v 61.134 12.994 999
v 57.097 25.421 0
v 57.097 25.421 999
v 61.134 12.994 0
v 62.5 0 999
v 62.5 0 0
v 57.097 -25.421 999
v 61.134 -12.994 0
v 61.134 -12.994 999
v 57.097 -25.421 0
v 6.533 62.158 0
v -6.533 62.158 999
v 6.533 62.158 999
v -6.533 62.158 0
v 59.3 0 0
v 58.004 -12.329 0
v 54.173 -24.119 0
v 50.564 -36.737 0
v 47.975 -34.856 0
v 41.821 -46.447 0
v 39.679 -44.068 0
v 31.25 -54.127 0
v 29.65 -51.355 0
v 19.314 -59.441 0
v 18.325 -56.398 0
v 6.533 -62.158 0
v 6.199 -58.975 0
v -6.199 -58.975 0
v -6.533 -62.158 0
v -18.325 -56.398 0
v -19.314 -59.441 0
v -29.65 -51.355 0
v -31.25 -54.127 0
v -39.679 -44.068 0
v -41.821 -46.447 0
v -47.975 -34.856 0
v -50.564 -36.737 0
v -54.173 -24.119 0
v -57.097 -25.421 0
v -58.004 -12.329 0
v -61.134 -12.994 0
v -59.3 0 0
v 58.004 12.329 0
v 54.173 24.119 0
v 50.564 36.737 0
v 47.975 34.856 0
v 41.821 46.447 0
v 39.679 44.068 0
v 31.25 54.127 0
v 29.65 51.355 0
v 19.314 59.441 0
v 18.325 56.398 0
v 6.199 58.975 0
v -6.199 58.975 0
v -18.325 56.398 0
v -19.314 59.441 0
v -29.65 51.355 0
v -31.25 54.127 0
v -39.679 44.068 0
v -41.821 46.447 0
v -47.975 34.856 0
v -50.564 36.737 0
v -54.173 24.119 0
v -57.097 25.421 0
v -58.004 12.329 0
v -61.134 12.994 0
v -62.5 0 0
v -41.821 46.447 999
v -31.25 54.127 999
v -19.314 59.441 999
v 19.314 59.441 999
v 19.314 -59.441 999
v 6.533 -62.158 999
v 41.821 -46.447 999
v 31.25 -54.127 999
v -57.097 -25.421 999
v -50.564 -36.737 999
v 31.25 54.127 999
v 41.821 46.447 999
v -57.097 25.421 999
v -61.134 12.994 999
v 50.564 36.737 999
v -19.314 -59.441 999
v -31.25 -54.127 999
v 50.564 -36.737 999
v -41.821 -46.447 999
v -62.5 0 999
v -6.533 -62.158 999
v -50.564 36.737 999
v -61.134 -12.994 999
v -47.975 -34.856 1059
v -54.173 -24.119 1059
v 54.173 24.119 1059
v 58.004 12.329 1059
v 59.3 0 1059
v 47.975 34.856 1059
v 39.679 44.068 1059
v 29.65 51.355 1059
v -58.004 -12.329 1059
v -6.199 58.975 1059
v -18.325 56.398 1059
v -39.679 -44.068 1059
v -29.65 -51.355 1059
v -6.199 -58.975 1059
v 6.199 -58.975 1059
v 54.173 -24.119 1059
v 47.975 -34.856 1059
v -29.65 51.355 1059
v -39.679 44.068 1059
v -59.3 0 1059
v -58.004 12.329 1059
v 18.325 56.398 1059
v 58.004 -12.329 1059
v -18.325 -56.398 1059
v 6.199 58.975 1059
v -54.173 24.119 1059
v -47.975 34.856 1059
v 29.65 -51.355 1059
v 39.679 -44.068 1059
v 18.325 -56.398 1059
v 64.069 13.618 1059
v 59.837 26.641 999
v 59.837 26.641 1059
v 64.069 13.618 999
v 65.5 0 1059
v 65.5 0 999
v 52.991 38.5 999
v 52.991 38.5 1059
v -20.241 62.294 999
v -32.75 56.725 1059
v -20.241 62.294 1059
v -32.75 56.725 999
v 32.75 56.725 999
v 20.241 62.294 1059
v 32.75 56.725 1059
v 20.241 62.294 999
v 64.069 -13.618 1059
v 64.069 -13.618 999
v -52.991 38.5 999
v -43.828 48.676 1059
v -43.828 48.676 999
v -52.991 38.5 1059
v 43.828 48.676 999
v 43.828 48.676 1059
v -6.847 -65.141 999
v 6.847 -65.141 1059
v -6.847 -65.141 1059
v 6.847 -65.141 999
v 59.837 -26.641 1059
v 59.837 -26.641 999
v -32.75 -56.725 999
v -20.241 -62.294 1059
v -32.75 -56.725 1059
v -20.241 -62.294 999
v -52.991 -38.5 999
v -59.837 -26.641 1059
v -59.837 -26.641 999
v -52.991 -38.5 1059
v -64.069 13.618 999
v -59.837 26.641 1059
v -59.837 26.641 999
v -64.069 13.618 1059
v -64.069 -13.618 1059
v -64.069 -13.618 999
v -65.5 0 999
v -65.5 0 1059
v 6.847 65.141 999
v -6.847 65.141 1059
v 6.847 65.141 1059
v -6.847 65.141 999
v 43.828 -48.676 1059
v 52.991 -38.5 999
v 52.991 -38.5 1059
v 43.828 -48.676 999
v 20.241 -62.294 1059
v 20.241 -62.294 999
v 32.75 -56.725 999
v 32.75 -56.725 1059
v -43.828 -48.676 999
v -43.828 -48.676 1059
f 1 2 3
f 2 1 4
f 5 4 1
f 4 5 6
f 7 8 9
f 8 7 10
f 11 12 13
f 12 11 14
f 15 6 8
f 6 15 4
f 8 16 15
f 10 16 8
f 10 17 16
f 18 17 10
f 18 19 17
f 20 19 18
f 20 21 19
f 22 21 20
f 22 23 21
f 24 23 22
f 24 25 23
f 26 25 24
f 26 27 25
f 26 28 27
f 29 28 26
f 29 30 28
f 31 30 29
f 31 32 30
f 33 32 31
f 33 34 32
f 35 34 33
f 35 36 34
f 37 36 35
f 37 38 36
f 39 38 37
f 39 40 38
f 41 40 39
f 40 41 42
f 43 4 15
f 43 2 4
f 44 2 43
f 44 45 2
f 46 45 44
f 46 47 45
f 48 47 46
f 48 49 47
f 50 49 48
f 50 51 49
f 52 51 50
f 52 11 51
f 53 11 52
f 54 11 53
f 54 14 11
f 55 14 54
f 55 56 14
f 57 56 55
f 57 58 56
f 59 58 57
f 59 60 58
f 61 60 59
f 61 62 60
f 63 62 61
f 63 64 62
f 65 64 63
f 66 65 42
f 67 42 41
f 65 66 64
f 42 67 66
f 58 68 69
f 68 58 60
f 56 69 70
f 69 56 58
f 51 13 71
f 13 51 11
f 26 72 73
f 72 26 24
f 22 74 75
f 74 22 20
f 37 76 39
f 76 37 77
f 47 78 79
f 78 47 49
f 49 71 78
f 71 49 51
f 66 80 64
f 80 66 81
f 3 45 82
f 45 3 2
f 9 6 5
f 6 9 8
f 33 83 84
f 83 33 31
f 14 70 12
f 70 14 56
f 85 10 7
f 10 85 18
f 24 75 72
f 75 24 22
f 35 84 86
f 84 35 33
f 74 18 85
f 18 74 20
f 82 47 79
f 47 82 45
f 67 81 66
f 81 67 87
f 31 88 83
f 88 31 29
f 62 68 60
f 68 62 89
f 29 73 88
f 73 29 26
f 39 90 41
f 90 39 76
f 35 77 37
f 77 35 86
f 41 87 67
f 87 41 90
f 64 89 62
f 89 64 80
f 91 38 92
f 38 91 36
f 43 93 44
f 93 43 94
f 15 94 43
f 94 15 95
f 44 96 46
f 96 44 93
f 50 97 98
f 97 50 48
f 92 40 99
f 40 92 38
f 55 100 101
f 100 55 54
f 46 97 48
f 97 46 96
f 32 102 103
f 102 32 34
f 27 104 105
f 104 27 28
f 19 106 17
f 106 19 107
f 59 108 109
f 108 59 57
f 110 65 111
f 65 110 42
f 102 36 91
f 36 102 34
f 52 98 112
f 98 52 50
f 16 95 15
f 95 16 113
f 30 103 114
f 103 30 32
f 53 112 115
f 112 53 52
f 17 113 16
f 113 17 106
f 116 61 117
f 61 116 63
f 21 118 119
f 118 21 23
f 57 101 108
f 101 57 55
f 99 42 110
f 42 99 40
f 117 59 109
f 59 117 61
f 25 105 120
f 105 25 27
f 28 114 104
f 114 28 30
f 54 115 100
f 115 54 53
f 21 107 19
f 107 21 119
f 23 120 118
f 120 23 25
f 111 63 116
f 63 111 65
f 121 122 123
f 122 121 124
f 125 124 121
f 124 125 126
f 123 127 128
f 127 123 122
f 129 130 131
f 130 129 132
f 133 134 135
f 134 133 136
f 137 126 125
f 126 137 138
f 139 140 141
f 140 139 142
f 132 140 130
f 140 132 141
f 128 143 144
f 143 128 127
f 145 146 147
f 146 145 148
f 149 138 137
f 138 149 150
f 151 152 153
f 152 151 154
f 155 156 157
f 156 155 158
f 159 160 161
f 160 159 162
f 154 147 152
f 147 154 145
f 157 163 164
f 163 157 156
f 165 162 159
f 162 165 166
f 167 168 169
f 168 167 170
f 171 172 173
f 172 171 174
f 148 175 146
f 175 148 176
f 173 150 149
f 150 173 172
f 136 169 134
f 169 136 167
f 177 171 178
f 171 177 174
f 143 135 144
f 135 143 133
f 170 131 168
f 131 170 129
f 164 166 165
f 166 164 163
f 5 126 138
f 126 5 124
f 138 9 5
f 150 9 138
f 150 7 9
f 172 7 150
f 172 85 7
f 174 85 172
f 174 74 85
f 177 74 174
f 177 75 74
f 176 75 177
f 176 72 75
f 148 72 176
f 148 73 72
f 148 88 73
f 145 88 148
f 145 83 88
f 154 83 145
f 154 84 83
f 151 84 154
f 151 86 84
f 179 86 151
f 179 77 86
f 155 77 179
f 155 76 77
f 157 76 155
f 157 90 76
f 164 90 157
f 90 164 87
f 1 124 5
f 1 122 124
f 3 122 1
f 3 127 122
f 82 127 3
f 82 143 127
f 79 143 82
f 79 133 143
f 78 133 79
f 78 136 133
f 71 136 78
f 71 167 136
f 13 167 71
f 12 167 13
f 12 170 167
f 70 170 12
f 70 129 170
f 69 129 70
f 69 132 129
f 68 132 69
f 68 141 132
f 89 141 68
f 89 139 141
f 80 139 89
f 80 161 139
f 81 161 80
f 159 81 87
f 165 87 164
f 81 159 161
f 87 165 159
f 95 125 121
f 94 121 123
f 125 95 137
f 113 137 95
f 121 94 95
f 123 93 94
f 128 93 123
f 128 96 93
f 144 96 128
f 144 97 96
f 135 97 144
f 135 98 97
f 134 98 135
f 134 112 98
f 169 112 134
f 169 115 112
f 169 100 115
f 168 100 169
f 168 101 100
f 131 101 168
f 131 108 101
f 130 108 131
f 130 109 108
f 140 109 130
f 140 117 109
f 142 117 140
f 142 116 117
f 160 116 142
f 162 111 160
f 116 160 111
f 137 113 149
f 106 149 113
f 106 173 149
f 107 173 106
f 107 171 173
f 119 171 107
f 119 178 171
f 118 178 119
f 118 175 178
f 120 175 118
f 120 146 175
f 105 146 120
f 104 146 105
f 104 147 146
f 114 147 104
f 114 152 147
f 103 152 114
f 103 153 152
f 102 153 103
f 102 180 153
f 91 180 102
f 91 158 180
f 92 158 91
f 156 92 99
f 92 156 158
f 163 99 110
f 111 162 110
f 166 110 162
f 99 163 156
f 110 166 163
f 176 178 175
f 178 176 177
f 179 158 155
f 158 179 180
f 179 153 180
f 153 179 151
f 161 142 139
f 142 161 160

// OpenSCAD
// Parameters
length_mm = 1000; //[500:2000:10]
ht125_outer_diameter = 125; //[100:250:1]
wall_thickness = 3.2; //[1.6:6.4:0.1]
socket_length = 60; //[30:120:1]
socket_wall_extra = 2.5; //[1:6:0.1]
socket_od_extra = 6; //[2:15:0.5]
stop_ring_length = 8; //[3:20:0.5]
stop_ring_radial = 2; //[0.5:6:0.1]
overlap_mm = 1; //[0.5:2:0.1]

// Ht Pipe - complete geometry
module ht_pipe() {
  color([0.85, 0.85, 0.8]) { // PVC color
    union() {
      // Pipe body
      difference() {
        cylinder(h=length_mm, r=ht125_outer_diameter/2, center=false);
        translate([0, 0, -overlap_mm])
          cylinder(h=length_mm + 2*overlap_mm, r=ht125_outer_diameter/2 - wall_thickness, center=false);
      }
      
      // End fitting
      difference() {
        translate([0, 0, length_mm - overlap_mm])
          cylinder(h=socket_length, r=ht125_outer_diameter/2 + socket_od_extra/2, center=false);
        translate([0, 0, length_mm - overlap_mm - overlap_mm])
          cylinder(h=socket_length + 2*overlap_mm, r=ht125_outer_diameter/2 - wall_thickness, center=false);
        translate([0, 0, length_mm + socket_length - stop_ring_length - overlap_mm - overlap_mm])
          cylinder(h=stop_ring_length + 2*overlap_mm, r=ht125_outer_diameter/2 - wall_thickness - stop_ring_radial, center=false);
      }
    }
  }
}

// Assembly
module assembly() {
  ht_pipe();
}

assembly();
